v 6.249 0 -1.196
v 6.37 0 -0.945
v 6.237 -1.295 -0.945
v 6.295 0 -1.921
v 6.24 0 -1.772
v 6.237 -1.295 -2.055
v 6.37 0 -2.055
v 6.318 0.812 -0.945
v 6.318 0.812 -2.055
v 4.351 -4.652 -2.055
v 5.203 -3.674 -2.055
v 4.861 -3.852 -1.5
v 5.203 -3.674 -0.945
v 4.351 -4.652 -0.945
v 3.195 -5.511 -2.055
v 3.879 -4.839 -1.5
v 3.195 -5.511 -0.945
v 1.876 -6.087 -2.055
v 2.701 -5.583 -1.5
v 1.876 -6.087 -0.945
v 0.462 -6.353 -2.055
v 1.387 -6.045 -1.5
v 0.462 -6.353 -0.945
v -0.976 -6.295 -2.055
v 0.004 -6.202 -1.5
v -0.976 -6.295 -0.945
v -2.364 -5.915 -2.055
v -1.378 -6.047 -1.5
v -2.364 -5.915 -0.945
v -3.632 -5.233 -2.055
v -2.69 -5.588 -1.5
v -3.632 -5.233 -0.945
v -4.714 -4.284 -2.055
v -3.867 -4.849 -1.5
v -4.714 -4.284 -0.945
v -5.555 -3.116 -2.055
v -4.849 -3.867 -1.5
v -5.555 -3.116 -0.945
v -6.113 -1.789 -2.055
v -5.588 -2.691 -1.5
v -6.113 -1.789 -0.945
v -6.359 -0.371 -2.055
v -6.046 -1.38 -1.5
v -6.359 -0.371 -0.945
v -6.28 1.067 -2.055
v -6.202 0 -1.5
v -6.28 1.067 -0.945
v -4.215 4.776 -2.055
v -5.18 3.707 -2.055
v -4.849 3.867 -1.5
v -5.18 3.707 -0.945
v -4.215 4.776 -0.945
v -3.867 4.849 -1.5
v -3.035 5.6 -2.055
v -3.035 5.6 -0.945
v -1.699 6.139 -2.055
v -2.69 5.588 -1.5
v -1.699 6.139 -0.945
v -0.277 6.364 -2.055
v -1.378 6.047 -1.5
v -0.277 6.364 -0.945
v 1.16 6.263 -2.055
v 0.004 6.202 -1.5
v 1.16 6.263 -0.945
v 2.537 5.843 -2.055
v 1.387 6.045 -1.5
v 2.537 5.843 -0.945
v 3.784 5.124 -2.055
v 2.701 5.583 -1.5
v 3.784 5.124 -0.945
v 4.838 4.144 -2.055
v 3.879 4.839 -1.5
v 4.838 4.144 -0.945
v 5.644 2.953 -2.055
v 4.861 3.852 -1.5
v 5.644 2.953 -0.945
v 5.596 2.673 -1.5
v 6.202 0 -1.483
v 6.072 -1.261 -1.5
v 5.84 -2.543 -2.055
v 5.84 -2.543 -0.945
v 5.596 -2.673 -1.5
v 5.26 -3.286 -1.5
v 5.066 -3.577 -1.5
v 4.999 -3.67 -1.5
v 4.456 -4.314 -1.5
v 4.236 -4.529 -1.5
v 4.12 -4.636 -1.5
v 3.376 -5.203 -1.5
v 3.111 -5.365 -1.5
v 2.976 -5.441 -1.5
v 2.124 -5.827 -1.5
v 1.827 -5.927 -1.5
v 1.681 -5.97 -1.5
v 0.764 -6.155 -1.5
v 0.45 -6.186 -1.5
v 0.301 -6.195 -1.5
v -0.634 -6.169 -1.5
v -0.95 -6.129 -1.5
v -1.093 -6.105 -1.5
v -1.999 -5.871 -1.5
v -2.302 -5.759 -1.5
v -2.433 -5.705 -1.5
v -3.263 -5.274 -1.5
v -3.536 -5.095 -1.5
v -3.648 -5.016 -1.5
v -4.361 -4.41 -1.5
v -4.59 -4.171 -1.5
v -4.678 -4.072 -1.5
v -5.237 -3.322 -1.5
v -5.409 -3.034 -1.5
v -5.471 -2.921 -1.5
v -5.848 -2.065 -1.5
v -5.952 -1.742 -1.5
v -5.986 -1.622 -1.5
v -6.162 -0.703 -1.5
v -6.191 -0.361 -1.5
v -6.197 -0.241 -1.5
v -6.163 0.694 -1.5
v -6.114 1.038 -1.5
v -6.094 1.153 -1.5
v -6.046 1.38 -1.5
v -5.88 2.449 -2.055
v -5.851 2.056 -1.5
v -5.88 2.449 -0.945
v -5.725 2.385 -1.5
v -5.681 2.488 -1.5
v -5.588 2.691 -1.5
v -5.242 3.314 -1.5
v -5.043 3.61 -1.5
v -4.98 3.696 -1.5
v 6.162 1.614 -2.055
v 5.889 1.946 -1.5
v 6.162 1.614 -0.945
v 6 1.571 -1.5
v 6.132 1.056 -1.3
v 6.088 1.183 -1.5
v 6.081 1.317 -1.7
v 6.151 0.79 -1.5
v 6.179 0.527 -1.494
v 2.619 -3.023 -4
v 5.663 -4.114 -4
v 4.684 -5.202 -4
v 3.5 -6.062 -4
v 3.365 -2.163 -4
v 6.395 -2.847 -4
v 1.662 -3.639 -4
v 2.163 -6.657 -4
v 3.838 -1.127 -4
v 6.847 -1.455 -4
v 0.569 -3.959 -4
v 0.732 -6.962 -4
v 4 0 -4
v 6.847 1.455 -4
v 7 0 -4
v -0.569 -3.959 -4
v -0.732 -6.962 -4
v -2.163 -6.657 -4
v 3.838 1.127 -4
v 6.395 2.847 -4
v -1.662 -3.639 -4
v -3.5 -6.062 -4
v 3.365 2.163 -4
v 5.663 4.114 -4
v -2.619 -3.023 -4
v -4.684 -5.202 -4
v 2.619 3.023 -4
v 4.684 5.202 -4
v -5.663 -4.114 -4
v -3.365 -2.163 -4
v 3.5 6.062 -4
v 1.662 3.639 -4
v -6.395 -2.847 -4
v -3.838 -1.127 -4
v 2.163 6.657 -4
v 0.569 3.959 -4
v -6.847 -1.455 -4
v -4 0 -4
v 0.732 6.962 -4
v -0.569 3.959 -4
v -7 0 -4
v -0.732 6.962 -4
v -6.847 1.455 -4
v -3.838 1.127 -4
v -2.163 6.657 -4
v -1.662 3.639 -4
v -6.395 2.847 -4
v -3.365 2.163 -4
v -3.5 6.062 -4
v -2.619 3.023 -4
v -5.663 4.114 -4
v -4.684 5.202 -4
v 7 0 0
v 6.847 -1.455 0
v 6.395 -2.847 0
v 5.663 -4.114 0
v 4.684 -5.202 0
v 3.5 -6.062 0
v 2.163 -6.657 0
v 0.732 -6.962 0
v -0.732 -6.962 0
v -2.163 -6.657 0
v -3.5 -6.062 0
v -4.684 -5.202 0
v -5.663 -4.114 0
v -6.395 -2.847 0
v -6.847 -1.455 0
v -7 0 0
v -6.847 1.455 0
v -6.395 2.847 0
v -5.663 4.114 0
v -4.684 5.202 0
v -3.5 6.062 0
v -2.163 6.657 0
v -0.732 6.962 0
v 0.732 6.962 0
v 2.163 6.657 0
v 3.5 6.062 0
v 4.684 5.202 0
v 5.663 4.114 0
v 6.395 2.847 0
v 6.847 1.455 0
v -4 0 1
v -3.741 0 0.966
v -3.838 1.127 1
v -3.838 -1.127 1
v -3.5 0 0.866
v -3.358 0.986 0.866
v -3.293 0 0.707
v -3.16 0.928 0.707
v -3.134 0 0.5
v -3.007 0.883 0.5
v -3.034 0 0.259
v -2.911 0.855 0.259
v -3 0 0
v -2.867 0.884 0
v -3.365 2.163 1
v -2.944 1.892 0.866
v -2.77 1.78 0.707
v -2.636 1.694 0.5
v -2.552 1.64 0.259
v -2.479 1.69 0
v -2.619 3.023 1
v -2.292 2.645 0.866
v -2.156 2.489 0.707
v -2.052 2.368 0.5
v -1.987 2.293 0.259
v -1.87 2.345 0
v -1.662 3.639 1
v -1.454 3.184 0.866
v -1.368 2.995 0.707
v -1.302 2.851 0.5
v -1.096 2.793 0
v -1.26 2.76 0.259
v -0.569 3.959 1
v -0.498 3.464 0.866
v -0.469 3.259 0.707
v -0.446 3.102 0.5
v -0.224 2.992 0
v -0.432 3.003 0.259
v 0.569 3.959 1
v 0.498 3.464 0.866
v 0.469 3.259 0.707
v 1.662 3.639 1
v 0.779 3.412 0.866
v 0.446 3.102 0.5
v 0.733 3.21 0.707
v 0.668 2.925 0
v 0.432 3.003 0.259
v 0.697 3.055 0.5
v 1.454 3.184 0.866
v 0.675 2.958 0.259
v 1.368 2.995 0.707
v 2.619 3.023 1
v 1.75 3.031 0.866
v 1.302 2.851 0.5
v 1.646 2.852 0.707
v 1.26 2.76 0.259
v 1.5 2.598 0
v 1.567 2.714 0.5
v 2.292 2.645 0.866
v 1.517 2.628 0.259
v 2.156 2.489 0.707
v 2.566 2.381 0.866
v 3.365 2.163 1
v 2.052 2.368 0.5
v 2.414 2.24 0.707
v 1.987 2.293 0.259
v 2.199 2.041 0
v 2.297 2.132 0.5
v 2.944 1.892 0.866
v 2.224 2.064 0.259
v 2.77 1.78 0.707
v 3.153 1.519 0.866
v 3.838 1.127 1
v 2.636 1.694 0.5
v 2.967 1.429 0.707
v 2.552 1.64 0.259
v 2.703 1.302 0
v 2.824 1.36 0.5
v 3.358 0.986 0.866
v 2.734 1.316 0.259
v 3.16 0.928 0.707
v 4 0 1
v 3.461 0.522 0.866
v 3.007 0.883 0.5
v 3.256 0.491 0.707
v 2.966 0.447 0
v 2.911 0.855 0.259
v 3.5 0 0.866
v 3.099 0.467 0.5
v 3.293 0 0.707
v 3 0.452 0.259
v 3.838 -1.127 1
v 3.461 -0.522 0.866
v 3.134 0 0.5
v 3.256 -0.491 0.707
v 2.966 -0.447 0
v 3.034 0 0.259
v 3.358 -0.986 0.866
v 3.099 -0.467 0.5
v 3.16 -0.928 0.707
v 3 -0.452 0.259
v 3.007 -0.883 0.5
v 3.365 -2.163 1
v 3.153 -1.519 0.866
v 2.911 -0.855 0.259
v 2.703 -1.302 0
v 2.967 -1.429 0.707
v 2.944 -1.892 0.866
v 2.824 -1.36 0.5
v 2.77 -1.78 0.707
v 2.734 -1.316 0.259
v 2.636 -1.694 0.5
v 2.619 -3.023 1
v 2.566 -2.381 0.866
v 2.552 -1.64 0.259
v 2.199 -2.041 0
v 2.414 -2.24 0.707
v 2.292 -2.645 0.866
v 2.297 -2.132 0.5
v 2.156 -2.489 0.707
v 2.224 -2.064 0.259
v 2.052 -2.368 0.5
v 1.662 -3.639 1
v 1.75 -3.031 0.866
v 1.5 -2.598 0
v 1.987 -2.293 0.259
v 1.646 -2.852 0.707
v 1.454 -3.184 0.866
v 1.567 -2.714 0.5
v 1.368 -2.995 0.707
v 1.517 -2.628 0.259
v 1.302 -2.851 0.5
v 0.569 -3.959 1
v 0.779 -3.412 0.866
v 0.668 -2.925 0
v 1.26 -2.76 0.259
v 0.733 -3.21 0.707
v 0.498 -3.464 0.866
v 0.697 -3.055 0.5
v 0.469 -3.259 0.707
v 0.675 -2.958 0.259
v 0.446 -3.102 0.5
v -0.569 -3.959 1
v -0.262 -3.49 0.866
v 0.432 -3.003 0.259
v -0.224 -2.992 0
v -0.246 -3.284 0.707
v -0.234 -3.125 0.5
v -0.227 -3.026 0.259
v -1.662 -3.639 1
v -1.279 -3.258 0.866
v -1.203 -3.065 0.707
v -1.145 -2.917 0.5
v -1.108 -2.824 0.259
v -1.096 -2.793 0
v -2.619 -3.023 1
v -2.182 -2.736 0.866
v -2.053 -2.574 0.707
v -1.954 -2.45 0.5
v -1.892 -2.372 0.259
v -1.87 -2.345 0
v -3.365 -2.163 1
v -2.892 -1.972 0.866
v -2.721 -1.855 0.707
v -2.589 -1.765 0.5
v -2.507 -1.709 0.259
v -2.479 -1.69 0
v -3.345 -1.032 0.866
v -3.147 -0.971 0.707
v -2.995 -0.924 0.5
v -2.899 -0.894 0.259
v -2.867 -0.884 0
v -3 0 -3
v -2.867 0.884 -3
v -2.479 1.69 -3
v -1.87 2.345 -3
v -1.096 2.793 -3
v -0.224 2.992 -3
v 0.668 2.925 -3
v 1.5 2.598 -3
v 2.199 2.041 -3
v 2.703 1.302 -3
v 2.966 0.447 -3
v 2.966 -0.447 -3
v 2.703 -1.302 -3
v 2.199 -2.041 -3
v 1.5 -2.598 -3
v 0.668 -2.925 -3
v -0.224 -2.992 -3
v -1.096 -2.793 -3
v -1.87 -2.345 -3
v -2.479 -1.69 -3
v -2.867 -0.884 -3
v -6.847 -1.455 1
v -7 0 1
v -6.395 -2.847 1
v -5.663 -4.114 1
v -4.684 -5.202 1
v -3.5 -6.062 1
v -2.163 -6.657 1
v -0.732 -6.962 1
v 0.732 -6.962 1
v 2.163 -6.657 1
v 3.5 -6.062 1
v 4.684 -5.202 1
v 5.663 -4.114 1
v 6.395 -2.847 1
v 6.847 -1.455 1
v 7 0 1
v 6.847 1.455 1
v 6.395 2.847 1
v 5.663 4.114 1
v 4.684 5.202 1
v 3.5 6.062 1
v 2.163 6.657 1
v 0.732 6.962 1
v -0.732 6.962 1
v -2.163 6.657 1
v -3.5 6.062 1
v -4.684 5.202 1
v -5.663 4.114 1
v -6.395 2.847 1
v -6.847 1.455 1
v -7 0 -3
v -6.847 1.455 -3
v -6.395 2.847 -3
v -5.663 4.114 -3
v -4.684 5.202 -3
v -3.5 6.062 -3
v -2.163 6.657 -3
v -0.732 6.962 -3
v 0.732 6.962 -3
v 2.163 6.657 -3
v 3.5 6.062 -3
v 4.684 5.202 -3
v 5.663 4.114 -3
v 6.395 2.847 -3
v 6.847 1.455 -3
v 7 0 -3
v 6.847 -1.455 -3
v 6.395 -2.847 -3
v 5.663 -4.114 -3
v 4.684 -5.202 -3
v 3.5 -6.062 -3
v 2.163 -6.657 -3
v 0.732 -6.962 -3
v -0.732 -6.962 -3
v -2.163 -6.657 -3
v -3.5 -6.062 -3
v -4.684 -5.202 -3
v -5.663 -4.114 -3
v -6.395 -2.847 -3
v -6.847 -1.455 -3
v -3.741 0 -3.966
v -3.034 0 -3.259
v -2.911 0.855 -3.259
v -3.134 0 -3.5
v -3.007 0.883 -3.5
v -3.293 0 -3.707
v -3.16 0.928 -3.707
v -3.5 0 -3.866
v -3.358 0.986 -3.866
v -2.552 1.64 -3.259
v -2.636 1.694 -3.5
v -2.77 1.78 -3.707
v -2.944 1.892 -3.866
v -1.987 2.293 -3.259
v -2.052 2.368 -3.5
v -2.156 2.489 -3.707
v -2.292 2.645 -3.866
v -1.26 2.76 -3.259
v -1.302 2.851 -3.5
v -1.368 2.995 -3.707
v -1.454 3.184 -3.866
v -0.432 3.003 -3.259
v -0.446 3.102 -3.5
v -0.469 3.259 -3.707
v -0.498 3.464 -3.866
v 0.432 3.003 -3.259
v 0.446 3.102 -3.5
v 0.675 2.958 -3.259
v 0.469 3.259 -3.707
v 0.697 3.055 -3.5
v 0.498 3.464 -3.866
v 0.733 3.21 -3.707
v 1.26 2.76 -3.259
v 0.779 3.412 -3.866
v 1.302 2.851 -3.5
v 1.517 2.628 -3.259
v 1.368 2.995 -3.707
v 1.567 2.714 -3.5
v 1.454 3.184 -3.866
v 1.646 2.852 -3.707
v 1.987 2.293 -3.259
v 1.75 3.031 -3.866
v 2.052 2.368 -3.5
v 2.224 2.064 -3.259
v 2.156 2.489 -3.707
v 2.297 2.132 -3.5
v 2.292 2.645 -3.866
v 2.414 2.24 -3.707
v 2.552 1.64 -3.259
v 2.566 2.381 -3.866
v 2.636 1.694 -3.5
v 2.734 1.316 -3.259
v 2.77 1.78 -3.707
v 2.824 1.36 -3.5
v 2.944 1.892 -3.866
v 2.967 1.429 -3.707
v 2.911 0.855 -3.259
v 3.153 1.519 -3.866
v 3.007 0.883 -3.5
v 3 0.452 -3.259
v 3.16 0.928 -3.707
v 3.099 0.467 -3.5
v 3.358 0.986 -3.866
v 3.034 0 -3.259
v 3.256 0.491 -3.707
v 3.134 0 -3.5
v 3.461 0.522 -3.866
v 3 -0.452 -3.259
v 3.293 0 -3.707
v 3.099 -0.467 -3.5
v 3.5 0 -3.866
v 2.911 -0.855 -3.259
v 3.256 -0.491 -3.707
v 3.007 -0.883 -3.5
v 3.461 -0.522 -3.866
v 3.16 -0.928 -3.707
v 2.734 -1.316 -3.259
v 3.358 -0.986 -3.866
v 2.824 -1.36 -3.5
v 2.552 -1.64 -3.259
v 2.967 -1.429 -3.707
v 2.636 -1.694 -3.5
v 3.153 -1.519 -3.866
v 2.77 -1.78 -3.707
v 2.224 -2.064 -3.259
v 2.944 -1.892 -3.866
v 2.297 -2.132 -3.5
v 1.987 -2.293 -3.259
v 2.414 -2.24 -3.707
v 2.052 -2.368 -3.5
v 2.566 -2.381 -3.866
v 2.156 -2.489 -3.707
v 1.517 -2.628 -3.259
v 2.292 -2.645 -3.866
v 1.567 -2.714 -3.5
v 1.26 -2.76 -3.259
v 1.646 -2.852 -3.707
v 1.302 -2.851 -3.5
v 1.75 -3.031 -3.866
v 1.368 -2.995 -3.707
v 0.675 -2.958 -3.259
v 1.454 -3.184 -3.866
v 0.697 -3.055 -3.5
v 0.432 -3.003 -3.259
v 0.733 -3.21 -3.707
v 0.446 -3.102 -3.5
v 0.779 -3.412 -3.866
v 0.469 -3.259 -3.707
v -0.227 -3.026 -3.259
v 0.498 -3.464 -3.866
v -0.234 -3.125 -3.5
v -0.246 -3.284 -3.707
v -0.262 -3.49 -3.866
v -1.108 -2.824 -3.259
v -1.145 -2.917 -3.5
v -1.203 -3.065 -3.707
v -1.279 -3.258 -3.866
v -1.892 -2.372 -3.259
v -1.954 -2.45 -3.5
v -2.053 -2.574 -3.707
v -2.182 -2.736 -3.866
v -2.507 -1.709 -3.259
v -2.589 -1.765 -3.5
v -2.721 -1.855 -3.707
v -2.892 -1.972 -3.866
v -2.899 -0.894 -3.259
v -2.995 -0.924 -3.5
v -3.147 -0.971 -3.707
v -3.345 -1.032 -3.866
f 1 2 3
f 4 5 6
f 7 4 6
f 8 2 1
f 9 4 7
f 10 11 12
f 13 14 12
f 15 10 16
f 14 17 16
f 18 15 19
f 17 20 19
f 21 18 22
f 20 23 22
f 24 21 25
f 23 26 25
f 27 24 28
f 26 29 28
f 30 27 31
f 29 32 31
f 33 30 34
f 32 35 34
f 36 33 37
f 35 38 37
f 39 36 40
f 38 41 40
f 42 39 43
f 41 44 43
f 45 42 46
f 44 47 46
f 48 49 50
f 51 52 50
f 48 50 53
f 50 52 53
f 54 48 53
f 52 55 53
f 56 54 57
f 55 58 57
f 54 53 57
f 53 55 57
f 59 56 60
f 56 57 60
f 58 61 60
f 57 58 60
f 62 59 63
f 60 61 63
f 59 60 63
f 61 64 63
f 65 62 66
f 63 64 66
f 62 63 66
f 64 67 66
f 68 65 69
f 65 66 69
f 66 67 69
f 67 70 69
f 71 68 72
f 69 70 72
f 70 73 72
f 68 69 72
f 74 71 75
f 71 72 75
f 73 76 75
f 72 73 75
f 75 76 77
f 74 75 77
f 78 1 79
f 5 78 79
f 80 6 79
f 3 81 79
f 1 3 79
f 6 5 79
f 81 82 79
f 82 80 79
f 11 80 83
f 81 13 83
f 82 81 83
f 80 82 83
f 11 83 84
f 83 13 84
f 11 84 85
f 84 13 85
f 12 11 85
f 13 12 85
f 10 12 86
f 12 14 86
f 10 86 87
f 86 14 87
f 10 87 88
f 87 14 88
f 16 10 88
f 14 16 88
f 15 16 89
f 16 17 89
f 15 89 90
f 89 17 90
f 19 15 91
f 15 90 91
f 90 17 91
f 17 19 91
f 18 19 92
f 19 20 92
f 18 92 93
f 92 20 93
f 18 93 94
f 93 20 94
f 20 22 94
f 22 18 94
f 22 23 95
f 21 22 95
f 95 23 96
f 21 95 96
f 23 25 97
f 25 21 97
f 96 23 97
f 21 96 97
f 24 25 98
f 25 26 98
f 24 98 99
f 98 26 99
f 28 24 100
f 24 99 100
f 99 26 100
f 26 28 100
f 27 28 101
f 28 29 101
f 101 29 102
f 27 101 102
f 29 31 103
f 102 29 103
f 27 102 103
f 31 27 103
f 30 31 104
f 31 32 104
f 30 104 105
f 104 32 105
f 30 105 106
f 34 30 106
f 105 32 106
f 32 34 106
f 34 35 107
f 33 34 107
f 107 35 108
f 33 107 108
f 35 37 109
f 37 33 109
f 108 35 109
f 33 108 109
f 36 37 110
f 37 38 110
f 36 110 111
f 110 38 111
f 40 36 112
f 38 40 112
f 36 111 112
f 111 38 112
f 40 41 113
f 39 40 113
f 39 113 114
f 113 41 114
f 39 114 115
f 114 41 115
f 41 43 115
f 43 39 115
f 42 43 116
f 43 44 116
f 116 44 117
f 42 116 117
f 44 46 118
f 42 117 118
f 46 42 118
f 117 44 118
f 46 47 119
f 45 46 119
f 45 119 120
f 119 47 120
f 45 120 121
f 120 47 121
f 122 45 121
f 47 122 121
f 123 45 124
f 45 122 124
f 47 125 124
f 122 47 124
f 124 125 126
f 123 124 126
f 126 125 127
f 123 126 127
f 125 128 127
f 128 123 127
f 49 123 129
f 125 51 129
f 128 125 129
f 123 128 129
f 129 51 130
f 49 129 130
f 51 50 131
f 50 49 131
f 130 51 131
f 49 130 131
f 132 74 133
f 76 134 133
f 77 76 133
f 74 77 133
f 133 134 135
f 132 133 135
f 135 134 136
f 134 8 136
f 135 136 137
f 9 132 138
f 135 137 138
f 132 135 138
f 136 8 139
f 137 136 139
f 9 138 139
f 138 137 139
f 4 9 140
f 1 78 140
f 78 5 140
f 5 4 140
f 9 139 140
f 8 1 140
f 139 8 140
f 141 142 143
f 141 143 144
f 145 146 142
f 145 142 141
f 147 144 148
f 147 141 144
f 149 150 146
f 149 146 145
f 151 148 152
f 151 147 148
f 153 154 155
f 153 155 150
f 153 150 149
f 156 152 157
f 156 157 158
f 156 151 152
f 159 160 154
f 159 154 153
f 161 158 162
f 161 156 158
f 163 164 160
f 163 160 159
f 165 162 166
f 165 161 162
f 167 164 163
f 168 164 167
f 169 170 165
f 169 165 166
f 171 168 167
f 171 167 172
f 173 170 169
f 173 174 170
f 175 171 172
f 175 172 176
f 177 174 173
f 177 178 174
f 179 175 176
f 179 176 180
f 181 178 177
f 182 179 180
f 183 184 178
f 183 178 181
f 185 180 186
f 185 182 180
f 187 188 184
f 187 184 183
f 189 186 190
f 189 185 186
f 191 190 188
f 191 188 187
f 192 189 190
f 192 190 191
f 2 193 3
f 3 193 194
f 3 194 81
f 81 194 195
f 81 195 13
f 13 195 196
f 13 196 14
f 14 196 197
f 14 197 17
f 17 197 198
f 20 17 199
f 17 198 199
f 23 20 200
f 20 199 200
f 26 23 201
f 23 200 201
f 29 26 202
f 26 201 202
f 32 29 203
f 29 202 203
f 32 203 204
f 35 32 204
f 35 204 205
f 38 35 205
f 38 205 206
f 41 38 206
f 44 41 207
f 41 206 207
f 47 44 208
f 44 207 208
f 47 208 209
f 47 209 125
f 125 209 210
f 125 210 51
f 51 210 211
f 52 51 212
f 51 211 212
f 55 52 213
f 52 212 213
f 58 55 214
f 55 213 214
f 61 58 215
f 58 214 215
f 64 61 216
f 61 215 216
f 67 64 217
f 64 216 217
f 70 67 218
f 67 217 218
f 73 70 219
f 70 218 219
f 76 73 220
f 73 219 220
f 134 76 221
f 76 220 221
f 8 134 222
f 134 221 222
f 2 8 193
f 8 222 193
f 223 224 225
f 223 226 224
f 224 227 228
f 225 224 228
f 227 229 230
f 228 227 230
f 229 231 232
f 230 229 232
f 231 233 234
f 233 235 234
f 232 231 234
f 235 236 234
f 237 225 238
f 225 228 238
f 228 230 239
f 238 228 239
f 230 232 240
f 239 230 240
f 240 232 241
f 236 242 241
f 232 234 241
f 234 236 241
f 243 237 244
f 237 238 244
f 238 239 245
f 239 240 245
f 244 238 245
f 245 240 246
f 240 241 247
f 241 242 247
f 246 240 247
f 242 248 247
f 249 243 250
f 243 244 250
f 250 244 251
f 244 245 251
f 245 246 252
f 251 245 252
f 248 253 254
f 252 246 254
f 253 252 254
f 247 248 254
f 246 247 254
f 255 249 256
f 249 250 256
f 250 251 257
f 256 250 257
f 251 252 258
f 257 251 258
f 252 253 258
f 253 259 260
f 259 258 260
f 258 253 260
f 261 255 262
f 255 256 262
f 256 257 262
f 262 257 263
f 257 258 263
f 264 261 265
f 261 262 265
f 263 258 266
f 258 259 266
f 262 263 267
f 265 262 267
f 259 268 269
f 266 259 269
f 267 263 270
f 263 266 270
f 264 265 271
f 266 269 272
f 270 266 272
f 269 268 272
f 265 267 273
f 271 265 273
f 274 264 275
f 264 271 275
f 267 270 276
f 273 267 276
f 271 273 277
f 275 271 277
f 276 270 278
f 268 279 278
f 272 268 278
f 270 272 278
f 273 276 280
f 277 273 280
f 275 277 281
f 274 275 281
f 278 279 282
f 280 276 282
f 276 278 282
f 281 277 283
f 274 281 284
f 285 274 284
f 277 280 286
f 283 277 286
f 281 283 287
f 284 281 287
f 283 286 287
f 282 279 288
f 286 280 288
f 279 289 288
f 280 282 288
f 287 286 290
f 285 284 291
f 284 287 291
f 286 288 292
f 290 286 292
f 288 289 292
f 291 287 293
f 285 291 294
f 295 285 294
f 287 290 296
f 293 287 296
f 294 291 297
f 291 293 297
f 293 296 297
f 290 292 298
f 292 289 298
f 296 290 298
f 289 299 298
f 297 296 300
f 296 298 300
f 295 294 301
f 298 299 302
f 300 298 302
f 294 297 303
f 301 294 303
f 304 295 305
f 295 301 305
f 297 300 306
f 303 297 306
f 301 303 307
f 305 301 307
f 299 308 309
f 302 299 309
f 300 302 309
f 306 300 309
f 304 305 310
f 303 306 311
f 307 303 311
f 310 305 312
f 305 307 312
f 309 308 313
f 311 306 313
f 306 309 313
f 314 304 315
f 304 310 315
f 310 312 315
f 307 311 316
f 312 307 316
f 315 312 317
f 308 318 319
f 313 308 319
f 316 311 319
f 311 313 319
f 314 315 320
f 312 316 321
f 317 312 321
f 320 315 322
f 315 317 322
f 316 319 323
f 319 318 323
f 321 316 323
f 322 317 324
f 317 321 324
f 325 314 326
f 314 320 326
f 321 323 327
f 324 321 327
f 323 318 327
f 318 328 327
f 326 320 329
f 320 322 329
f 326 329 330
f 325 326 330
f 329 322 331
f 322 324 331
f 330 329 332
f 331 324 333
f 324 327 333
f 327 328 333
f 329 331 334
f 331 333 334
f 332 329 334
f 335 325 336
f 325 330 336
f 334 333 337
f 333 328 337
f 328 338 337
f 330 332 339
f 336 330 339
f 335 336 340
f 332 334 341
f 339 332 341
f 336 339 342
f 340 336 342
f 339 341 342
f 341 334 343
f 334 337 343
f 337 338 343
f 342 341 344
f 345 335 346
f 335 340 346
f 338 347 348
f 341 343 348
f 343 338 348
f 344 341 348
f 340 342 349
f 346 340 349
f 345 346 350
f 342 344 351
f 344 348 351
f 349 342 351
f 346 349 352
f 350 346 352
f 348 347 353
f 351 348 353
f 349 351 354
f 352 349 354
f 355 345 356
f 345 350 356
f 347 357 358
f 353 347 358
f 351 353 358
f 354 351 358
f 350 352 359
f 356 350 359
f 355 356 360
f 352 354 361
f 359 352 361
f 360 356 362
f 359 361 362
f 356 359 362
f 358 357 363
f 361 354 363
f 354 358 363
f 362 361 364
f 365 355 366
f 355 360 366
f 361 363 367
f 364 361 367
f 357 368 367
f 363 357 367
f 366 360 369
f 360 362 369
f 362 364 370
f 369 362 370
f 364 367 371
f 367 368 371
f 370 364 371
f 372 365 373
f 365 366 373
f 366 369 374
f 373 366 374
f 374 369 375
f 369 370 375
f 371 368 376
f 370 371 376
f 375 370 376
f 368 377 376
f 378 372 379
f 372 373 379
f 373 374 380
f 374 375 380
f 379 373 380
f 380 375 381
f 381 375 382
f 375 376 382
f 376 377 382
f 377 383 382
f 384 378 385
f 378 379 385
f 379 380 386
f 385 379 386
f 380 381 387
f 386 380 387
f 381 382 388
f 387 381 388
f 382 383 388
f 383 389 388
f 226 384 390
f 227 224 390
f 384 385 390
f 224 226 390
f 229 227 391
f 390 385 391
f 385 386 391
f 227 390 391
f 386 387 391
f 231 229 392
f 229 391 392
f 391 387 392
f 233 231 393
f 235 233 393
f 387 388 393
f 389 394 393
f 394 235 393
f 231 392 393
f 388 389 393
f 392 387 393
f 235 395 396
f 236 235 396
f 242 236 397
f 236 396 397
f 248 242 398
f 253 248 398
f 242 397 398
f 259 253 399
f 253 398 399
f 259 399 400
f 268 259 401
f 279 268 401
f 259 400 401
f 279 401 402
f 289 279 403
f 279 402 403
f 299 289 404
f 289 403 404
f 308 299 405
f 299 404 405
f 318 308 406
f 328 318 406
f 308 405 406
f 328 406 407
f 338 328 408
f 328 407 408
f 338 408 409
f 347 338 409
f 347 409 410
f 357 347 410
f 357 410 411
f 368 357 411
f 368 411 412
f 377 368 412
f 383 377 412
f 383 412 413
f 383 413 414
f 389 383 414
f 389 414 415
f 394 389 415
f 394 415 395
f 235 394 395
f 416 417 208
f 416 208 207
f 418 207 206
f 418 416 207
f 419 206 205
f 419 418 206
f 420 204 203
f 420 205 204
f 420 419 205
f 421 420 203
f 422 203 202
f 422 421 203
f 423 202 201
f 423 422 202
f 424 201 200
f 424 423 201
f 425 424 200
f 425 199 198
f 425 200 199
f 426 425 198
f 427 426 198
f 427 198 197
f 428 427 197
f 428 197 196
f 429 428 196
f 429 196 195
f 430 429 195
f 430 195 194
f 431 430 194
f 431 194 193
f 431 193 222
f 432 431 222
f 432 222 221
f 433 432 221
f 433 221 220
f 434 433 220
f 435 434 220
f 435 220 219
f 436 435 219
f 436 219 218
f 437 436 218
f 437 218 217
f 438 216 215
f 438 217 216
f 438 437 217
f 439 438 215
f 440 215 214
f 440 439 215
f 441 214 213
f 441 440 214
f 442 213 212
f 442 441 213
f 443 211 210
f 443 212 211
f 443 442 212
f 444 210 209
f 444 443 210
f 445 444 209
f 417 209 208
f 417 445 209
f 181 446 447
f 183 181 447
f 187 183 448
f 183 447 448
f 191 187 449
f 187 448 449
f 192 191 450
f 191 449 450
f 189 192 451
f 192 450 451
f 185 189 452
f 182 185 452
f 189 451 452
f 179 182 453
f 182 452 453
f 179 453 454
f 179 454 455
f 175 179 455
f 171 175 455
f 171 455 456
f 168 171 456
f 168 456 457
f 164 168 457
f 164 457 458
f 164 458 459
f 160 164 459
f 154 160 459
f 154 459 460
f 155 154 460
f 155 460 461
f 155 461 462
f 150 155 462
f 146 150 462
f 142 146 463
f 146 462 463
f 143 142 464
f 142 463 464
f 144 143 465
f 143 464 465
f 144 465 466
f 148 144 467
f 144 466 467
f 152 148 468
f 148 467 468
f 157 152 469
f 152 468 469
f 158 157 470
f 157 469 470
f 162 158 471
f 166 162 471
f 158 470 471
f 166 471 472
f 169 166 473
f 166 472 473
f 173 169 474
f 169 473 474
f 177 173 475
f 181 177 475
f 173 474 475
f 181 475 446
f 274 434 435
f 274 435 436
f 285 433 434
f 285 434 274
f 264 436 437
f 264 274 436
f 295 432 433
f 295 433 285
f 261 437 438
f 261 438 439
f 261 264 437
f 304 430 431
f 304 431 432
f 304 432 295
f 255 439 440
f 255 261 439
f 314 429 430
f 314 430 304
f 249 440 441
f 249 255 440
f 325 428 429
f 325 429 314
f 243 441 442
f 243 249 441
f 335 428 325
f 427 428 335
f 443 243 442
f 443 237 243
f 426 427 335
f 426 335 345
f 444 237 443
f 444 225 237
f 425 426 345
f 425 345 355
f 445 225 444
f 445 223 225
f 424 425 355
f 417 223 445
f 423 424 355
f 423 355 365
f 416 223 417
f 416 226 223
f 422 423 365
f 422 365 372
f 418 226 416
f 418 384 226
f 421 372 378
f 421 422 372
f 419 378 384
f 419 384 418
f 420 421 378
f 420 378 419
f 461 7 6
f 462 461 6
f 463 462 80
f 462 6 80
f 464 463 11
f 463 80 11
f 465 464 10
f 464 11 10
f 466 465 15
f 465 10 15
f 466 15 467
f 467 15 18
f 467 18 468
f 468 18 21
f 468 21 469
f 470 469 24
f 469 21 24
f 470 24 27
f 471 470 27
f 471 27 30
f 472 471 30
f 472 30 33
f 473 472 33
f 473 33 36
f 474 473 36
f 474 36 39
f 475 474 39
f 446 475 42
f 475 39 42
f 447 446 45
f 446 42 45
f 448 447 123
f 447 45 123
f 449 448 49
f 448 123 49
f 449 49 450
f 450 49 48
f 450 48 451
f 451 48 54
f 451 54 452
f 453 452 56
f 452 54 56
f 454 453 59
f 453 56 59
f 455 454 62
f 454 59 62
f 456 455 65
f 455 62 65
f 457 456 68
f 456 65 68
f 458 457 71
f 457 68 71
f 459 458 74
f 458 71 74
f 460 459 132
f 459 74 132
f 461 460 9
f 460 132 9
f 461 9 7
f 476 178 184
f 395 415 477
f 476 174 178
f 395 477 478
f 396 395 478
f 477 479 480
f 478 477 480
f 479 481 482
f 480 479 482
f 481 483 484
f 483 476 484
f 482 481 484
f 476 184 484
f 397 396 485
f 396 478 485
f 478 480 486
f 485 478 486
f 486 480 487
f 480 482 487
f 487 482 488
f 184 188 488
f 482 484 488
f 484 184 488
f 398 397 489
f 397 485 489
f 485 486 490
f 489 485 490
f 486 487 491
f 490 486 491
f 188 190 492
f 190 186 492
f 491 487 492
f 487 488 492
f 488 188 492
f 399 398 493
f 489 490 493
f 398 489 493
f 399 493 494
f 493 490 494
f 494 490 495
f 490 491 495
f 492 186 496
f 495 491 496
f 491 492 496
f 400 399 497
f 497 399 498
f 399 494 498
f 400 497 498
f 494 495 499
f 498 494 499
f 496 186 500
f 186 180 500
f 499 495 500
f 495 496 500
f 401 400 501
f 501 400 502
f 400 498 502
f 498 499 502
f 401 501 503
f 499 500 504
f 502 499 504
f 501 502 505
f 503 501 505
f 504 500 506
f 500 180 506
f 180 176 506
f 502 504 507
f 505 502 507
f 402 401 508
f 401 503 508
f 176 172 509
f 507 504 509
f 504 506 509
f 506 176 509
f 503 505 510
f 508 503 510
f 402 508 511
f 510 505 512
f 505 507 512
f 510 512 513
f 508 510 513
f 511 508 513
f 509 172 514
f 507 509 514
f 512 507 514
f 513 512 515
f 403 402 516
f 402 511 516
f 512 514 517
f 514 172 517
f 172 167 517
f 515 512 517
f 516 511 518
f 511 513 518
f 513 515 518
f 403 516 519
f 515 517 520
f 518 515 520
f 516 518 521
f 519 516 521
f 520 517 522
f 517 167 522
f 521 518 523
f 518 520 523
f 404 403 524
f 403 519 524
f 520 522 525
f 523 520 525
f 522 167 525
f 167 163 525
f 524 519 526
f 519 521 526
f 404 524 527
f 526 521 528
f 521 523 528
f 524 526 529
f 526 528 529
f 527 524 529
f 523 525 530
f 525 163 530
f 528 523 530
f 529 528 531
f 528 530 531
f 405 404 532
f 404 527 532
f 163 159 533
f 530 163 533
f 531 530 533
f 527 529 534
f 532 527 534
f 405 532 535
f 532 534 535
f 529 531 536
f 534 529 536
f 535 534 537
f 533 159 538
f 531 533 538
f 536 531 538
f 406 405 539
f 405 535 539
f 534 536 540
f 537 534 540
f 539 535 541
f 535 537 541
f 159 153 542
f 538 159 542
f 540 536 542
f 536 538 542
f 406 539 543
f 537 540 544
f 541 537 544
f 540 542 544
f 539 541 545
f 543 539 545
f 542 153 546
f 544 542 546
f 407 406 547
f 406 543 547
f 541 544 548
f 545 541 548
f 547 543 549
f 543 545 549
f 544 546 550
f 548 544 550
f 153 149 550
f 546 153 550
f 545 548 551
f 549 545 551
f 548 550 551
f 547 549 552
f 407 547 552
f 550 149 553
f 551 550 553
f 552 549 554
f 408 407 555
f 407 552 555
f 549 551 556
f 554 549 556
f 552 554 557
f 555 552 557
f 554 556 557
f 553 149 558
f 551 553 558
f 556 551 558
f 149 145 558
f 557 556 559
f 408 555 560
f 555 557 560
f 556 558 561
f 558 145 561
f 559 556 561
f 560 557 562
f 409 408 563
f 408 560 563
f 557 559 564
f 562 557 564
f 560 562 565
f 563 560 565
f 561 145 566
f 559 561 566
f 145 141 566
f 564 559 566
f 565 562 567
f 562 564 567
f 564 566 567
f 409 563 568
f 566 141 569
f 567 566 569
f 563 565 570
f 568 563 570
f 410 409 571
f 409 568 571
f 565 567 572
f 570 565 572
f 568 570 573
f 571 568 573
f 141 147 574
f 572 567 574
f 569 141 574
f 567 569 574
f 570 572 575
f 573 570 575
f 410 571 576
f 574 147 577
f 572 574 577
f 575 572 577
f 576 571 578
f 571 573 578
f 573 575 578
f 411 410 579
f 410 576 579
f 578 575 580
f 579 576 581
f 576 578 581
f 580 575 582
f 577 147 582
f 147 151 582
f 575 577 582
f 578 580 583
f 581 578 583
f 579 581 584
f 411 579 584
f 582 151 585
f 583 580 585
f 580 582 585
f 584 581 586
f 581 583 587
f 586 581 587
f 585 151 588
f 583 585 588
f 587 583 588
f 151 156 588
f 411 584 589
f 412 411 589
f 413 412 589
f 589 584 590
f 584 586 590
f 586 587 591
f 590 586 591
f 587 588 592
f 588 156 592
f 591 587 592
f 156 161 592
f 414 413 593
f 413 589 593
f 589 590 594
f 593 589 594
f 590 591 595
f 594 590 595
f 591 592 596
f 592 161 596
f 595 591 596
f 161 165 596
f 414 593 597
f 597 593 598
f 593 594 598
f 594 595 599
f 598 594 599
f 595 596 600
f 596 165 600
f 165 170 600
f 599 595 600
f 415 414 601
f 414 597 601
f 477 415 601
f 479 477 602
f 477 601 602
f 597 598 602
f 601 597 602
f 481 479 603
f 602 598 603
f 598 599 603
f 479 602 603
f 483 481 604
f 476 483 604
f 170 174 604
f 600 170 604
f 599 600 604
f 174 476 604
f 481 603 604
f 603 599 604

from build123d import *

# Parameters (mm, degrees)
SKETCH_3_R          = 7
EXTRUDE_1_DEPTH     = 1
EXTRUDE_START       = 1
SKETCH_4_R          = 7
EXTRUDE_2_DEPTH     = 1
SKETCH_5_R          = 3
CUT_EXTRUDE_3_DEPTH = 12.090536506
FILLET_2_R          = 1
FILLET_3_R          = 1


with BuildPart() as part:
    # Эскиз2 → Повернуть1 (revolve)
    with BuildSketch(Plane(origin=(0, 0, 0), x_dir=(1, 0, 0), z_dir=(0, 1, 0))):
        Polygon((7, 0), (0, 0), (0, 3), (7, 3), (6, 1.5), align=None)
    revolve(axis=Axis((0, 0, 0), (0, 0, -1)))

    # Эскиз3 → Вытянуть1 (add)
    with BuildSketch(Plane(origin=(0, 0, -3), x_dir=(-1, 0, 0), z_dir=(0, 0, -1))):
        Circle(SKETCH_3_R)
    extrude(amount=EXTRUDE_1_DEPTH)

    # Эскиз4 → Вытянуть2 (add)
    with BuildSketch(Plane.XY.offset(EXTRUDE_START)):
        with Locations(Location((0, 0, 0), (0, 0, 180))):
            Circle(SKETCH_4_R)
    extrude(amount=-EXTRUDE_2_DEPTH)

    # Эскиз5 → Вытянуть3 (cut, through all)
    with BuildSketch(Plane(origin=(0, 0, -4), x_dir=(-1, 0, 0), z_dir=(0, 0, -1))):
        Circle(SKETCH_5_R)
    extrude(amount=-CUT_EXTRUDE_3_DEPTH, mode=Mode.SUBTRACT)

    # Скругление2
    fillet_2_edges = [part.edges().sort_by_distance(p)[0] for p in [
        (-6, 0, -1.5),
    ]]
    fillet(fillet_2_edges, radius=FILLET_2_R)

    # Скругление3
    fillet_3_edges = [part.edges().sort_by_distance(p)[0] for p in [
        (3, 0, 1),
        (3, 0, -4),
    ]]
    fillet(fillet_3_edges, radius=FILLET_3_R)


solid = part.part
